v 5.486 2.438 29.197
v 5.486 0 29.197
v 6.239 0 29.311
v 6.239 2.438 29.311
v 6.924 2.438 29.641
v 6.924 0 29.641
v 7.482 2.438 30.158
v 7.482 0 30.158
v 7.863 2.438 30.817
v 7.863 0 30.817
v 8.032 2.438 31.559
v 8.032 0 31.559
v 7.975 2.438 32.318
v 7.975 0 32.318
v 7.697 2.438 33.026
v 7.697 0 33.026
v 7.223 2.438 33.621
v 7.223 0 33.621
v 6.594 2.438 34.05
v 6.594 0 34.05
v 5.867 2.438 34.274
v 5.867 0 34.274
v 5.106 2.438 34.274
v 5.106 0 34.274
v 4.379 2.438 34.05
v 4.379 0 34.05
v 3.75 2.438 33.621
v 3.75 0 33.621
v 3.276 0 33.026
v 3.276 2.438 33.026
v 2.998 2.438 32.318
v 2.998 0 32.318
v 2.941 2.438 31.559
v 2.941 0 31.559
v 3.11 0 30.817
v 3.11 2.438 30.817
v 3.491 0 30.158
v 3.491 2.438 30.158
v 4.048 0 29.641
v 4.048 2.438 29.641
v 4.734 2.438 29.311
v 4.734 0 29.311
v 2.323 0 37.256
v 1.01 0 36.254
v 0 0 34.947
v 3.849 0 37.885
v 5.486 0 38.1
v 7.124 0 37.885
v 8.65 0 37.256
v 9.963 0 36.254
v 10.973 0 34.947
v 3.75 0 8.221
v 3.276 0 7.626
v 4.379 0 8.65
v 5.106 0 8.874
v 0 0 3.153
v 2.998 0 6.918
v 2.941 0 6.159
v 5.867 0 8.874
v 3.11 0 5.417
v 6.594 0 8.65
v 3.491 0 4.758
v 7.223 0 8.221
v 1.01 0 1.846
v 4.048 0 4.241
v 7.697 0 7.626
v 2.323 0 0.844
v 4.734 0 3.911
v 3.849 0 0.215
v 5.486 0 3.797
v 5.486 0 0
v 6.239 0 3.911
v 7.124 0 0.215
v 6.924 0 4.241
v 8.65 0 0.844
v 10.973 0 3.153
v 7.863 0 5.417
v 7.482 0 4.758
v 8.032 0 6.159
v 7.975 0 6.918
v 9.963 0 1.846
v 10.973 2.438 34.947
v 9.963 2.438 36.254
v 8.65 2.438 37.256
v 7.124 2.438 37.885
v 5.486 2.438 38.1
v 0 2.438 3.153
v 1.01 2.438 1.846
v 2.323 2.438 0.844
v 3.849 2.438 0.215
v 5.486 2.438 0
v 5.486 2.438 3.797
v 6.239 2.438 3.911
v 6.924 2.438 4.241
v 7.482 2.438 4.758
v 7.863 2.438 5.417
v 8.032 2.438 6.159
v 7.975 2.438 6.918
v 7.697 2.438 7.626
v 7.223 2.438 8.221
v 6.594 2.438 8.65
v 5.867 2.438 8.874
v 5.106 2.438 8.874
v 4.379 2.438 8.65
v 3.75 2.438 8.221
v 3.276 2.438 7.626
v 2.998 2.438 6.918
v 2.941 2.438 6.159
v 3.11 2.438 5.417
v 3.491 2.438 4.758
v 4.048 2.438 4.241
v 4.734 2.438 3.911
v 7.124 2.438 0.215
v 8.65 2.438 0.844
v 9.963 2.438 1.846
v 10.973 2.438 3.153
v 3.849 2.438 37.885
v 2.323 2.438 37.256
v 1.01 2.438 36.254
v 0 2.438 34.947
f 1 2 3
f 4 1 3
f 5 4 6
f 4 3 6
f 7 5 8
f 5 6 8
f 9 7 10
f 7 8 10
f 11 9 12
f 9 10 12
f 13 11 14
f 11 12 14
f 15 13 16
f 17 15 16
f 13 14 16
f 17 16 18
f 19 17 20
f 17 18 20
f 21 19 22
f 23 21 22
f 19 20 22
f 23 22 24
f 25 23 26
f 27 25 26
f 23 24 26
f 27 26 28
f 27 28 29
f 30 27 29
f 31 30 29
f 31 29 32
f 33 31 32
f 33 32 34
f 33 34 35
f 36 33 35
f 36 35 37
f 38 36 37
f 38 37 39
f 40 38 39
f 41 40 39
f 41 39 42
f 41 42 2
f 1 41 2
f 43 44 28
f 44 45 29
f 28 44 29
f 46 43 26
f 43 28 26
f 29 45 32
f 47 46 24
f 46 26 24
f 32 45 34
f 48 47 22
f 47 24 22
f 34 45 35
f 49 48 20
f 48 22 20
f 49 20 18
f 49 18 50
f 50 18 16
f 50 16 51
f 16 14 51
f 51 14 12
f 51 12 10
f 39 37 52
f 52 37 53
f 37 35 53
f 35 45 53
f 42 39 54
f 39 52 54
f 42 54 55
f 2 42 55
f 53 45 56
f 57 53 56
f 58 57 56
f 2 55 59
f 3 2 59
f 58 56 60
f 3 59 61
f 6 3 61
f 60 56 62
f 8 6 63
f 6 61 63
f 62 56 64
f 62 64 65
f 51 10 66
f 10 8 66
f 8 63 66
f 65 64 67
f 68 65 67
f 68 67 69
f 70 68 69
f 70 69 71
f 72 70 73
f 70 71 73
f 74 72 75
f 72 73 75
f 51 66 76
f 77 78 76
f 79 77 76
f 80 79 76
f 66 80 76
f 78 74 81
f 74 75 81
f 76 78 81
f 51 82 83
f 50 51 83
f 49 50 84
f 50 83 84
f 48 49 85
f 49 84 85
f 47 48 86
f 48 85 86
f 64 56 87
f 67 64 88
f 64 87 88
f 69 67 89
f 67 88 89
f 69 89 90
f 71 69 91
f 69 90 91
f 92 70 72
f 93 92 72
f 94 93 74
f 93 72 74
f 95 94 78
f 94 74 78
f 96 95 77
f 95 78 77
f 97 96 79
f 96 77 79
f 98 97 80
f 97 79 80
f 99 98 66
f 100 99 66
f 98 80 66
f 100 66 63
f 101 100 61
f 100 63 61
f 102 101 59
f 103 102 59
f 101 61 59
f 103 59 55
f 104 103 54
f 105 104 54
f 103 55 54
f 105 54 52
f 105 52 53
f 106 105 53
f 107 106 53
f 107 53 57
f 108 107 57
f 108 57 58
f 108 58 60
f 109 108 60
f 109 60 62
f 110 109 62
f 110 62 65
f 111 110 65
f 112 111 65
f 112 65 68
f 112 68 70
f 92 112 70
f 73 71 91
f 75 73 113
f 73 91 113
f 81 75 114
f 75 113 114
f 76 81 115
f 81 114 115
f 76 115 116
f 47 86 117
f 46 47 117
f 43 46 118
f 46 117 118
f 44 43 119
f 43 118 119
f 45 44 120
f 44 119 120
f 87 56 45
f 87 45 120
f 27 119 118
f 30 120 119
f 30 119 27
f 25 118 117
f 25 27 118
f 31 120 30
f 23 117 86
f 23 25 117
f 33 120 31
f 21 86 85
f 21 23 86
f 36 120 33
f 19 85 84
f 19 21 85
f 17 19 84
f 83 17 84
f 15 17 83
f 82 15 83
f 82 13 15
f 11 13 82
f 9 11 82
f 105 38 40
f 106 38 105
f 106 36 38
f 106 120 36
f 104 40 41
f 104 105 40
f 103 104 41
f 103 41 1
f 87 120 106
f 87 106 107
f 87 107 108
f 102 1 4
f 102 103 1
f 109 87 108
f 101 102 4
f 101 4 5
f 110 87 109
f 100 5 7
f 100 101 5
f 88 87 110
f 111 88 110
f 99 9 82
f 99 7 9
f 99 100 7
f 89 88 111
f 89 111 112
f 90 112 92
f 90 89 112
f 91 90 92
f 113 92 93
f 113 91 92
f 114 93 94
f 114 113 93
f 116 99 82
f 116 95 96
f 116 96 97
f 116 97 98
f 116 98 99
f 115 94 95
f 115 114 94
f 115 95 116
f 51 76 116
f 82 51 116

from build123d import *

# Parameters (mm, degrees)
SKETCH1_W               = 10.9728
SKETCH1_H               = 2.4384
EXTRUDE1_DEPTH          = 38.1
F_1_4_20_TAPPED_HOLE1_D = 5.1054
CUT_EXTRUDE1_DEPTH      = 40.723521173


with BuildPart() as part:
    # Sketch1 → Extrude1 (new body)
    with BuildSketch(Plane.XY):
        with Locations((5.4864, 1.2192)):
            Rectangle(SKETCH1_W, SKETCH1_H)
    extrude(amount=EXTRUDE1_DEPTH)

    # 1/4-20 Tapped Hole1 (through all)
    with Locations(Plane(origin=(5.4864, 2.4384, 6.35), x_dir=(0, 0, 1), z_dir=(0, 1, 0))):
        with Locations((0, 0), (25.4, 0)):
            Hole(F_1_4_20_TAPPED_HOLE1_D / 2)

    # Sketch4 → Cut-Extrude1 (cut, through all)
    with BuildSketch(Plane(origin=(0, 2.4384, 0), x_dir=(-1, 0, 0), z_dir=(0, 1, 0))):
        with BuildLine():
            ThreePointArc((0, 3.152827024), (-2.322505912, 0.84434162), (-5.4864, 0))
            Line((-5.4864, 0), (0, 0))
            Line((0, 0), (0, 3.152827024))
        make_face()
        with BuildLine():
            ThreePointArc((-5.4864, 0), (-8.651032451, 0.844765995), (-10.97365738, 3.154298755))
            Line((-10.97365738, 3.154298755), (-10.9728, 0))
            Line((-10.9728, 0), (-5.4864, 0))
        make_face()
        with BuildLine():
            Line((-10.9728, 38.1), (-10.97365738, 34.945701245))
            ThreePointArc((-10.97365738, 34.945701245), (-8.651032451, 37.255234005), (-5.4864, 38.1))
            Line((-5.4864, 38.1), (-10.9728, 38.1))
        make_face()
        with BuildLine():
            Line((0, 38.1), (-5.4864, 38.1))
            ThreePointArc((-5.4864, 38.1), (-2.322505912, 37.25565838), (0, 34.947172976))
            Line((0, 34.947172976), (0, 38.1))
        make_face()
    extrude(amount=-CUT_EXTRUDE1_DEPTH, mode=Mode.SUBTRACT)


solid = part.part
